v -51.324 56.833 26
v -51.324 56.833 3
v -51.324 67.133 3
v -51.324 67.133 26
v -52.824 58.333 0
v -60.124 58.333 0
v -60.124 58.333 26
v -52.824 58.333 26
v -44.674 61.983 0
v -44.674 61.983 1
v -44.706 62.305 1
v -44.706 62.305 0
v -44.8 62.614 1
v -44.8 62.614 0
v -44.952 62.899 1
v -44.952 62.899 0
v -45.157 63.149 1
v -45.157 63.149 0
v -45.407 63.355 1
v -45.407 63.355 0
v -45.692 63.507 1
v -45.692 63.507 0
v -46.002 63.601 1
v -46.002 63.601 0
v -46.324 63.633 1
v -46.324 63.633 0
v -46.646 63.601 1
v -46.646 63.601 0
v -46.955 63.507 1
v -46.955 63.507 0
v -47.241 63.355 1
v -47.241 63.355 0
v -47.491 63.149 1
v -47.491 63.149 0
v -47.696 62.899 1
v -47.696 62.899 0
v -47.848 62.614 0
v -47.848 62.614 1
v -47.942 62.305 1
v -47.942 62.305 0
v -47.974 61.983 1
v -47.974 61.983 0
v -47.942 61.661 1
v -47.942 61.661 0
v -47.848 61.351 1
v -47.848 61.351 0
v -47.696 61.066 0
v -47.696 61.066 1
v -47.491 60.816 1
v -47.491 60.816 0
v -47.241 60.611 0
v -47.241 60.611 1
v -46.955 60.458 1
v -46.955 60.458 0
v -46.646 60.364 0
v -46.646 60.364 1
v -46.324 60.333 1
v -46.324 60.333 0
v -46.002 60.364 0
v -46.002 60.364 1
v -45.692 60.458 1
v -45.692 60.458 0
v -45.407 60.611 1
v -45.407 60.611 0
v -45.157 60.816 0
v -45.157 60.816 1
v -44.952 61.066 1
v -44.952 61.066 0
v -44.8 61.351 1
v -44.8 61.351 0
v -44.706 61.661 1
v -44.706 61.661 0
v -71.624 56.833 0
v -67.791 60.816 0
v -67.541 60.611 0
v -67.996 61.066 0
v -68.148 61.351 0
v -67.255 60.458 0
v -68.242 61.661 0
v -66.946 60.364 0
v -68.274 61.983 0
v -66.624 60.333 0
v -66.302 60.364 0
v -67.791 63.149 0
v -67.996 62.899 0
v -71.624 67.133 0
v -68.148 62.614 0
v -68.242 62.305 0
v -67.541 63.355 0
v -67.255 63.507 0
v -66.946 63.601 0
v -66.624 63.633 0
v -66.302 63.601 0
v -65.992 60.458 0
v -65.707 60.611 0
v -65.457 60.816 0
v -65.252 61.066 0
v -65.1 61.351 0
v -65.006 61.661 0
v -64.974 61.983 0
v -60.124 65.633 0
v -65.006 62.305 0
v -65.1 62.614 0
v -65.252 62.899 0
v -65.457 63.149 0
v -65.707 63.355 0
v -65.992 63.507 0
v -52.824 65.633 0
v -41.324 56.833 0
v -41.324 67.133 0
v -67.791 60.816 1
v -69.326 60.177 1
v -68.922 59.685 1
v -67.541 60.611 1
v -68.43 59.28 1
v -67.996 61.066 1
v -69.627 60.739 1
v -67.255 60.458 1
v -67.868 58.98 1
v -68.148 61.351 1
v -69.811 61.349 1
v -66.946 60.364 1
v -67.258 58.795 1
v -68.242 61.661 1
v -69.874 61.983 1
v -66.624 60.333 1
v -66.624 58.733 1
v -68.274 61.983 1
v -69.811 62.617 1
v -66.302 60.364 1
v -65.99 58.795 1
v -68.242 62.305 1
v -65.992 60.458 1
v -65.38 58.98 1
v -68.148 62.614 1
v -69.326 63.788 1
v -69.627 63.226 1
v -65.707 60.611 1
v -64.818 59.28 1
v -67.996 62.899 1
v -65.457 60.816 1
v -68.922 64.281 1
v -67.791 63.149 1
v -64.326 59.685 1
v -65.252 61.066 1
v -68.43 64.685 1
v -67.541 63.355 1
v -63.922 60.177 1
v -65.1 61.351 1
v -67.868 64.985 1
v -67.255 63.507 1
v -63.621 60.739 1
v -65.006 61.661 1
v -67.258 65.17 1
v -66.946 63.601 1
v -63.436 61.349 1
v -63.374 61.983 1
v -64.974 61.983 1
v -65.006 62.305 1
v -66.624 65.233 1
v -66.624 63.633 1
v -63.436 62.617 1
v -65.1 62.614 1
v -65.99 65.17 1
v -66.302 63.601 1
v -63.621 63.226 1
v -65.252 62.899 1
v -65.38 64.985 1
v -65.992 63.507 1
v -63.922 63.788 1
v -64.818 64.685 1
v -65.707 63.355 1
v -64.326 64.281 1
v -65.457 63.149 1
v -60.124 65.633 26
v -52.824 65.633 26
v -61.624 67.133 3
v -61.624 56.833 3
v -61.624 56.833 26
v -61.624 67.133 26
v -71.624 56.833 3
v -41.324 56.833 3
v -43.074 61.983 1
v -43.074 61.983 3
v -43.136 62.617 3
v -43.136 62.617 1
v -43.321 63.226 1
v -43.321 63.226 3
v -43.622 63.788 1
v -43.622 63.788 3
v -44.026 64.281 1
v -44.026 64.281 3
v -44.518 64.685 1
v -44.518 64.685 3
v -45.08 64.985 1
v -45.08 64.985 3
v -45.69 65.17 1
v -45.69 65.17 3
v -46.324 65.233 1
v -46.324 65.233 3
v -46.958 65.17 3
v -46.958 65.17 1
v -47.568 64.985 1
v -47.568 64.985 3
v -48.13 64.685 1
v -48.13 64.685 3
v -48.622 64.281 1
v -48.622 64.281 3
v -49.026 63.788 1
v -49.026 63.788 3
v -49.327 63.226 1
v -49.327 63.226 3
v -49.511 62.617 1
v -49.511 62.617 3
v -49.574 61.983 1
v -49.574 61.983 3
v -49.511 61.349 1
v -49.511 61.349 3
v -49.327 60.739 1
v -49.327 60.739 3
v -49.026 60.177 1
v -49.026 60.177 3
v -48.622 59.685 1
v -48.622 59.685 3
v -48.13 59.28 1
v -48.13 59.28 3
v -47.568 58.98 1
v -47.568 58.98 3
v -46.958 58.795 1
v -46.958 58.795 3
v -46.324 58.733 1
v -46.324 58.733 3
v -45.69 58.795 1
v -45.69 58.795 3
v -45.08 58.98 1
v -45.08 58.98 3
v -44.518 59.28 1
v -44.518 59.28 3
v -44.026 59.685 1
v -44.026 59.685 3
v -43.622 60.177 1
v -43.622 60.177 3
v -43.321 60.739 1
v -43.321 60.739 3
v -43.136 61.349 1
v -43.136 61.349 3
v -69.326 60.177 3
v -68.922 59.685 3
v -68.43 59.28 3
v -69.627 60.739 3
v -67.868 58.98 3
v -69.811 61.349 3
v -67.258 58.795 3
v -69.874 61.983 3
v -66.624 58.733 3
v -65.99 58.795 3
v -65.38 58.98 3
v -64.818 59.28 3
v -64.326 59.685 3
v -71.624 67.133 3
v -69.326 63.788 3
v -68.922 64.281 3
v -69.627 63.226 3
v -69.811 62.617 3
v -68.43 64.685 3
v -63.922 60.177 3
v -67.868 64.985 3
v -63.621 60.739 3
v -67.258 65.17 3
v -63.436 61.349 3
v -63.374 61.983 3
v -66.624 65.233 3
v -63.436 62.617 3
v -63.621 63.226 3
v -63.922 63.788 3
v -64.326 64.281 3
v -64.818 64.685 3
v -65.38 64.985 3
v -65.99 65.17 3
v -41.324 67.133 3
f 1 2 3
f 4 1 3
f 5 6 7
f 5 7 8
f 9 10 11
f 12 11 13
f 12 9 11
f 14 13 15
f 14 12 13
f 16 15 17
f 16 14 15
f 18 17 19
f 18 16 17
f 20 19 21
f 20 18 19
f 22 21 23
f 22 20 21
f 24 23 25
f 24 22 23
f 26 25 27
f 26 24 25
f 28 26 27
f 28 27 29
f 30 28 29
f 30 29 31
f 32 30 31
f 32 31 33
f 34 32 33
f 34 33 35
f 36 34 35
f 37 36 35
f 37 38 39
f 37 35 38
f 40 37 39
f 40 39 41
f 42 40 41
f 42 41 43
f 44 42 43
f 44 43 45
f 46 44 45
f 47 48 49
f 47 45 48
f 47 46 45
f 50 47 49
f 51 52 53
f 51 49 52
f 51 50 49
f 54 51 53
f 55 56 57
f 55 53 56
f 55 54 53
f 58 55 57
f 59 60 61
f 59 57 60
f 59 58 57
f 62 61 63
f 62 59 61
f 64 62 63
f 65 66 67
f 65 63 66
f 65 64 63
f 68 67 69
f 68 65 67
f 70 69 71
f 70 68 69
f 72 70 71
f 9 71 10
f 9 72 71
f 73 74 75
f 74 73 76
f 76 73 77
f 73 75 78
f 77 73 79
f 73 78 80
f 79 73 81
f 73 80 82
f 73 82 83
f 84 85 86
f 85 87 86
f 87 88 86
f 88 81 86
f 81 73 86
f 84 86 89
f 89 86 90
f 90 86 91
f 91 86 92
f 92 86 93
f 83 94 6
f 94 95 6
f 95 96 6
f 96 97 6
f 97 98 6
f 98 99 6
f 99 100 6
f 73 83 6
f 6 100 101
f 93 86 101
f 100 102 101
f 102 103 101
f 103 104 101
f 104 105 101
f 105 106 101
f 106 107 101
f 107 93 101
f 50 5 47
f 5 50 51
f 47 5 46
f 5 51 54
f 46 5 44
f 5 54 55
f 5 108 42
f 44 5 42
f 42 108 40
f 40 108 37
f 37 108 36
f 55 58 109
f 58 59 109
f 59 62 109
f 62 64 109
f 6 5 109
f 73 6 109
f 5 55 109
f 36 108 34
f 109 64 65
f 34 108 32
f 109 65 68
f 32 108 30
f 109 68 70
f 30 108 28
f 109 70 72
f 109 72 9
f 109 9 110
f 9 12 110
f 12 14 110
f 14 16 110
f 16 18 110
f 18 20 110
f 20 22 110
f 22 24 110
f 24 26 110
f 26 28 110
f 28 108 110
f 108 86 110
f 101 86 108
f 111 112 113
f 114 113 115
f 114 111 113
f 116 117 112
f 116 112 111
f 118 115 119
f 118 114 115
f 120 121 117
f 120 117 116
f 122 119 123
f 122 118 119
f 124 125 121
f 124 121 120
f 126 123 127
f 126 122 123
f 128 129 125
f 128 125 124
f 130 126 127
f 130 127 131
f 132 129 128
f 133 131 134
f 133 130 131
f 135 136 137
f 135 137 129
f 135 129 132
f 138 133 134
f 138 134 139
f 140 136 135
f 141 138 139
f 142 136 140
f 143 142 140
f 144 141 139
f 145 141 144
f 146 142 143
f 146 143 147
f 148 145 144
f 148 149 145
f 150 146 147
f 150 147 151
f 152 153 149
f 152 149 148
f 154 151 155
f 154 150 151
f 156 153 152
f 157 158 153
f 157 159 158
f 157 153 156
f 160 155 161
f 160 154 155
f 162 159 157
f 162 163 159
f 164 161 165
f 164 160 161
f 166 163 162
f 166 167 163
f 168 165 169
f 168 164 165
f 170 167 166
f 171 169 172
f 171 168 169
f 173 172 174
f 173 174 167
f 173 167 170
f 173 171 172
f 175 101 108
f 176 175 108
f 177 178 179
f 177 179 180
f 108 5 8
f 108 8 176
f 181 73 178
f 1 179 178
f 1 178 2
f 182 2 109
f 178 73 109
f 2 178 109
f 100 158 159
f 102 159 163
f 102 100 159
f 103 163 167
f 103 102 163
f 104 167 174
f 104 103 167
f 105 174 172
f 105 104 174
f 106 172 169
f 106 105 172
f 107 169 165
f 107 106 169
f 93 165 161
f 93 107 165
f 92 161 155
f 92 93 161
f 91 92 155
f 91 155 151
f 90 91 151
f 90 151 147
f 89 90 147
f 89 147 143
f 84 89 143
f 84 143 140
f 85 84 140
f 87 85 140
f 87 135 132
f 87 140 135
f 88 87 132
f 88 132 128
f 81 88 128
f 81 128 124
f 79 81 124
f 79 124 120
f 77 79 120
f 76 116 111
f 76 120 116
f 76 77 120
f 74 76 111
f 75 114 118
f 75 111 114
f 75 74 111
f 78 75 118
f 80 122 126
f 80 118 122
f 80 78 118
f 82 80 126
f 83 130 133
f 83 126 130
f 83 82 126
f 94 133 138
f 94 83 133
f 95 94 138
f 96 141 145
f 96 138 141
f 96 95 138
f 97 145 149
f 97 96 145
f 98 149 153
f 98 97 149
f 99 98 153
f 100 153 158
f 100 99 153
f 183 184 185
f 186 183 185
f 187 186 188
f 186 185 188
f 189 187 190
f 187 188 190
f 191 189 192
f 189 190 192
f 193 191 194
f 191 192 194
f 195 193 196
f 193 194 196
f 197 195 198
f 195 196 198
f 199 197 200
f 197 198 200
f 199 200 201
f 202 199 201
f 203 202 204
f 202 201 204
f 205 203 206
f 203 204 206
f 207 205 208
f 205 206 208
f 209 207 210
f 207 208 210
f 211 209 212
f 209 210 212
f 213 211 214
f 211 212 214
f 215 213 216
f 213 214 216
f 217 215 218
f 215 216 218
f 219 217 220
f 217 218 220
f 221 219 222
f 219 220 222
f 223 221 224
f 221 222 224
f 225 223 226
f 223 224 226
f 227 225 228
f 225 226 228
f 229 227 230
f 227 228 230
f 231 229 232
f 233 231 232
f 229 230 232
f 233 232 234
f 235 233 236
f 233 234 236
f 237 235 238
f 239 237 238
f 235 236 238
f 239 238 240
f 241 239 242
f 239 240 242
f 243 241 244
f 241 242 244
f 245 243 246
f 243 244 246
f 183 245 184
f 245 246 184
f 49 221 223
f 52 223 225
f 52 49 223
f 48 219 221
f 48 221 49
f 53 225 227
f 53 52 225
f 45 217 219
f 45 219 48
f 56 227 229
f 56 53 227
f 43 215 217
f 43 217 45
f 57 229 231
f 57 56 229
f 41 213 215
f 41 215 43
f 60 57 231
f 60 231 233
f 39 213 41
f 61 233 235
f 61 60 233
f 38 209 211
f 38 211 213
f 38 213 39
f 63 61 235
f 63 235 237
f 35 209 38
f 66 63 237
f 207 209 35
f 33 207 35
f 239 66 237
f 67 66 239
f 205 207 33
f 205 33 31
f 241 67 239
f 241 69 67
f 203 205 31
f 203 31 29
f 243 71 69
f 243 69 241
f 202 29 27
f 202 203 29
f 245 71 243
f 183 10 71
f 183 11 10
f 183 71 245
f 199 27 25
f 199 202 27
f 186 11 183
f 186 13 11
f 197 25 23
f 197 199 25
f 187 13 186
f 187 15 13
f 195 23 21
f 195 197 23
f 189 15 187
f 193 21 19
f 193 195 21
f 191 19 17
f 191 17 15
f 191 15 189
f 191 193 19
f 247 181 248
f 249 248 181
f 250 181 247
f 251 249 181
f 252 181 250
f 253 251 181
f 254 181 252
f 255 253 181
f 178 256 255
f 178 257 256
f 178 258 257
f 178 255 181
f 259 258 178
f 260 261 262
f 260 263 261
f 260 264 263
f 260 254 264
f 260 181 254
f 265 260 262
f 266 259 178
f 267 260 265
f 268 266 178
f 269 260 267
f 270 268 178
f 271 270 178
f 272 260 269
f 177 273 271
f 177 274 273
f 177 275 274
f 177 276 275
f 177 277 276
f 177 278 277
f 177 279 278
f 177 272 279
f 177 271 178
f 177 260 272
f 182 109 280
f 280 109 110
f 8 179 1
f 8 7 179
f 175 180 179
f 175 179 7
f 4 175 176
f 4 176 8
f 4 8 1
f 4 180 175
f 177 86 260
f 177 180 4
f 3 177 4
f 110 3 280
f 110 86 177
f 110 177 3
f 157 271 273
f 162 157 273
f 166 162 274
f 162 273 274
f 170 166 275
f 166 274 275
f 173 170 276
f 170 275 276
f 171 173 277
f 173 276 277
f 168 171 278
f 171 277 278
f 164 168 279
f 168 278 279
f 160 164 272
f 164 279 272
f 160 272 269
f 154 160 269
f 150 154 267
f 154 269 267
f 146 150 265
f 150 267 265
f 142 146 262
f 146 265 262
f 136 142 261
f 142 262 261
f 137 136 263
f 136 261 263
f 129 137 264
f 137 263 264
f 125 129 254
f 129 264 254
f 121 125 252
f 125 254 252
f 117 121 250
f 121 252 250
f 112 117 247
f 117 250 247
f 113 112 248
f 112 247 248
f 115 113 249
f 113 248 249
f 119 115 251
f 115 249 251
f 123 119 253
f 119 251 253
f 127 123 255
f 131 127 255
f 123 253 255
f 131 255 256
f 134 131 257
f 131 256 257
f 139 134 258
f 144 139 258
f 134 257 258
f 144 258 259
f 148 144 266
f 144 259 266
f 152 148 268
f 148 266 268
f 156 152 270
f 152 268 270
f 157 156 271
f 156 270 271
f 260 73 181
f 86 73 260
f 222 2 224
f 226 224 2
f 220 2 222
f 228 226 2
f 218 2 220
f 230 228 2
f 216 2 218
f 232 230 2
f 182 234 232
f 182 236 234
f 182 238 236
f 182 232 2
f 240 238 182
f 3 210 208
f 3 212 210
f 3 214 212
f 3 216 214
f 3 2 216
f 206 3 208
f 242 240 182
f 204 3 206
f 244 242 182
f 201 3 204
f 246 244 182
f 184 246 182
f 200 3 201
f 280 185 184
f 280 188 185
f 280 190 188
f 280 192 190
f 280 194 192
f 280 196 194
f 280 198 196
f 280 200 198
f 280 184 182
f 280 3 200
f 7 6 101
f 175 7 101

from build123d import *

# Parameters (mm, degrees)
CROQUIS1_W              = 10.3
CROQUIS1_H              = 10.3
CROQUIS1_W_2            = 7.3
CROQUIS1_H_2            = 7.3
SALIENTE_EXTRUIR1_DEPTH = 26
CROQUIS2_W              = 10
CROQUIS2_H              = 10.3
CROQUIS2_R              = 1.65
SALIENTE_EXTRUIR2_DEPTH = 3
CROQUIS3_R              = 3.25
CORTAR_EXTRUIR1_DEPTH   = 2


with BuildPart() as part:
    # Croquis1 → Saliente-Extruir1 (new body)
    with BuildSketch(Plane.XY):
        with Locations((-56.473903104, 61.98267988)):
            Rectangle(CROQUIS1_W, CROQUIS1_H)
        with Locations((-56.473903104, 61.98267988)):
            Rectangle(CROQUIS1_W_2, CROQUIS1_H_2, mode=Mode.SUBTRACT)
    extrude(amount=SALIENTE_EXTRUIR1_DEPTH)

    # Croquis2 → Saliente-Extruir2 (add)
    with BuildSketch(Plane.XY):
        with Locations((-46.323903104, 61.98267988)):
            Rectangle(CROQUIS2_W, CROQUIS2_H)
        with Locations((-46.323903104, 61.98267988)):
            Circle(CROQUIS2_R, mode=Mode.SUBTRACT)
        with Locations((-66.623903104, 61.98267988)):
            Rectangle(CROQUIS2_W, CROQUIS2_H)
        with Locations((-66.623903104, 61.98267988)):
            Circle(CROQUIS2_R, mode=Mode.SUBTRACT)
    extrude(amount=SALIENTE_EXTRUIR2_DEPTH)

    # Croquis3 → Cortar-Extruir1 (cut)
    with BuildSketch(Plane.XY.offset(3)):
        with Locations((-66.623903104, 61.98267988)):
            Circle(CROQUIS3_R)
        with Locations((-46.323903104, 61.98267988)):
            Circle(CROQUIS3_R)
    extrude(amount=-CORTAR_EXTRUIR1_DEPTH, mode=Mode.SUBTRACT)


solid = part.part
